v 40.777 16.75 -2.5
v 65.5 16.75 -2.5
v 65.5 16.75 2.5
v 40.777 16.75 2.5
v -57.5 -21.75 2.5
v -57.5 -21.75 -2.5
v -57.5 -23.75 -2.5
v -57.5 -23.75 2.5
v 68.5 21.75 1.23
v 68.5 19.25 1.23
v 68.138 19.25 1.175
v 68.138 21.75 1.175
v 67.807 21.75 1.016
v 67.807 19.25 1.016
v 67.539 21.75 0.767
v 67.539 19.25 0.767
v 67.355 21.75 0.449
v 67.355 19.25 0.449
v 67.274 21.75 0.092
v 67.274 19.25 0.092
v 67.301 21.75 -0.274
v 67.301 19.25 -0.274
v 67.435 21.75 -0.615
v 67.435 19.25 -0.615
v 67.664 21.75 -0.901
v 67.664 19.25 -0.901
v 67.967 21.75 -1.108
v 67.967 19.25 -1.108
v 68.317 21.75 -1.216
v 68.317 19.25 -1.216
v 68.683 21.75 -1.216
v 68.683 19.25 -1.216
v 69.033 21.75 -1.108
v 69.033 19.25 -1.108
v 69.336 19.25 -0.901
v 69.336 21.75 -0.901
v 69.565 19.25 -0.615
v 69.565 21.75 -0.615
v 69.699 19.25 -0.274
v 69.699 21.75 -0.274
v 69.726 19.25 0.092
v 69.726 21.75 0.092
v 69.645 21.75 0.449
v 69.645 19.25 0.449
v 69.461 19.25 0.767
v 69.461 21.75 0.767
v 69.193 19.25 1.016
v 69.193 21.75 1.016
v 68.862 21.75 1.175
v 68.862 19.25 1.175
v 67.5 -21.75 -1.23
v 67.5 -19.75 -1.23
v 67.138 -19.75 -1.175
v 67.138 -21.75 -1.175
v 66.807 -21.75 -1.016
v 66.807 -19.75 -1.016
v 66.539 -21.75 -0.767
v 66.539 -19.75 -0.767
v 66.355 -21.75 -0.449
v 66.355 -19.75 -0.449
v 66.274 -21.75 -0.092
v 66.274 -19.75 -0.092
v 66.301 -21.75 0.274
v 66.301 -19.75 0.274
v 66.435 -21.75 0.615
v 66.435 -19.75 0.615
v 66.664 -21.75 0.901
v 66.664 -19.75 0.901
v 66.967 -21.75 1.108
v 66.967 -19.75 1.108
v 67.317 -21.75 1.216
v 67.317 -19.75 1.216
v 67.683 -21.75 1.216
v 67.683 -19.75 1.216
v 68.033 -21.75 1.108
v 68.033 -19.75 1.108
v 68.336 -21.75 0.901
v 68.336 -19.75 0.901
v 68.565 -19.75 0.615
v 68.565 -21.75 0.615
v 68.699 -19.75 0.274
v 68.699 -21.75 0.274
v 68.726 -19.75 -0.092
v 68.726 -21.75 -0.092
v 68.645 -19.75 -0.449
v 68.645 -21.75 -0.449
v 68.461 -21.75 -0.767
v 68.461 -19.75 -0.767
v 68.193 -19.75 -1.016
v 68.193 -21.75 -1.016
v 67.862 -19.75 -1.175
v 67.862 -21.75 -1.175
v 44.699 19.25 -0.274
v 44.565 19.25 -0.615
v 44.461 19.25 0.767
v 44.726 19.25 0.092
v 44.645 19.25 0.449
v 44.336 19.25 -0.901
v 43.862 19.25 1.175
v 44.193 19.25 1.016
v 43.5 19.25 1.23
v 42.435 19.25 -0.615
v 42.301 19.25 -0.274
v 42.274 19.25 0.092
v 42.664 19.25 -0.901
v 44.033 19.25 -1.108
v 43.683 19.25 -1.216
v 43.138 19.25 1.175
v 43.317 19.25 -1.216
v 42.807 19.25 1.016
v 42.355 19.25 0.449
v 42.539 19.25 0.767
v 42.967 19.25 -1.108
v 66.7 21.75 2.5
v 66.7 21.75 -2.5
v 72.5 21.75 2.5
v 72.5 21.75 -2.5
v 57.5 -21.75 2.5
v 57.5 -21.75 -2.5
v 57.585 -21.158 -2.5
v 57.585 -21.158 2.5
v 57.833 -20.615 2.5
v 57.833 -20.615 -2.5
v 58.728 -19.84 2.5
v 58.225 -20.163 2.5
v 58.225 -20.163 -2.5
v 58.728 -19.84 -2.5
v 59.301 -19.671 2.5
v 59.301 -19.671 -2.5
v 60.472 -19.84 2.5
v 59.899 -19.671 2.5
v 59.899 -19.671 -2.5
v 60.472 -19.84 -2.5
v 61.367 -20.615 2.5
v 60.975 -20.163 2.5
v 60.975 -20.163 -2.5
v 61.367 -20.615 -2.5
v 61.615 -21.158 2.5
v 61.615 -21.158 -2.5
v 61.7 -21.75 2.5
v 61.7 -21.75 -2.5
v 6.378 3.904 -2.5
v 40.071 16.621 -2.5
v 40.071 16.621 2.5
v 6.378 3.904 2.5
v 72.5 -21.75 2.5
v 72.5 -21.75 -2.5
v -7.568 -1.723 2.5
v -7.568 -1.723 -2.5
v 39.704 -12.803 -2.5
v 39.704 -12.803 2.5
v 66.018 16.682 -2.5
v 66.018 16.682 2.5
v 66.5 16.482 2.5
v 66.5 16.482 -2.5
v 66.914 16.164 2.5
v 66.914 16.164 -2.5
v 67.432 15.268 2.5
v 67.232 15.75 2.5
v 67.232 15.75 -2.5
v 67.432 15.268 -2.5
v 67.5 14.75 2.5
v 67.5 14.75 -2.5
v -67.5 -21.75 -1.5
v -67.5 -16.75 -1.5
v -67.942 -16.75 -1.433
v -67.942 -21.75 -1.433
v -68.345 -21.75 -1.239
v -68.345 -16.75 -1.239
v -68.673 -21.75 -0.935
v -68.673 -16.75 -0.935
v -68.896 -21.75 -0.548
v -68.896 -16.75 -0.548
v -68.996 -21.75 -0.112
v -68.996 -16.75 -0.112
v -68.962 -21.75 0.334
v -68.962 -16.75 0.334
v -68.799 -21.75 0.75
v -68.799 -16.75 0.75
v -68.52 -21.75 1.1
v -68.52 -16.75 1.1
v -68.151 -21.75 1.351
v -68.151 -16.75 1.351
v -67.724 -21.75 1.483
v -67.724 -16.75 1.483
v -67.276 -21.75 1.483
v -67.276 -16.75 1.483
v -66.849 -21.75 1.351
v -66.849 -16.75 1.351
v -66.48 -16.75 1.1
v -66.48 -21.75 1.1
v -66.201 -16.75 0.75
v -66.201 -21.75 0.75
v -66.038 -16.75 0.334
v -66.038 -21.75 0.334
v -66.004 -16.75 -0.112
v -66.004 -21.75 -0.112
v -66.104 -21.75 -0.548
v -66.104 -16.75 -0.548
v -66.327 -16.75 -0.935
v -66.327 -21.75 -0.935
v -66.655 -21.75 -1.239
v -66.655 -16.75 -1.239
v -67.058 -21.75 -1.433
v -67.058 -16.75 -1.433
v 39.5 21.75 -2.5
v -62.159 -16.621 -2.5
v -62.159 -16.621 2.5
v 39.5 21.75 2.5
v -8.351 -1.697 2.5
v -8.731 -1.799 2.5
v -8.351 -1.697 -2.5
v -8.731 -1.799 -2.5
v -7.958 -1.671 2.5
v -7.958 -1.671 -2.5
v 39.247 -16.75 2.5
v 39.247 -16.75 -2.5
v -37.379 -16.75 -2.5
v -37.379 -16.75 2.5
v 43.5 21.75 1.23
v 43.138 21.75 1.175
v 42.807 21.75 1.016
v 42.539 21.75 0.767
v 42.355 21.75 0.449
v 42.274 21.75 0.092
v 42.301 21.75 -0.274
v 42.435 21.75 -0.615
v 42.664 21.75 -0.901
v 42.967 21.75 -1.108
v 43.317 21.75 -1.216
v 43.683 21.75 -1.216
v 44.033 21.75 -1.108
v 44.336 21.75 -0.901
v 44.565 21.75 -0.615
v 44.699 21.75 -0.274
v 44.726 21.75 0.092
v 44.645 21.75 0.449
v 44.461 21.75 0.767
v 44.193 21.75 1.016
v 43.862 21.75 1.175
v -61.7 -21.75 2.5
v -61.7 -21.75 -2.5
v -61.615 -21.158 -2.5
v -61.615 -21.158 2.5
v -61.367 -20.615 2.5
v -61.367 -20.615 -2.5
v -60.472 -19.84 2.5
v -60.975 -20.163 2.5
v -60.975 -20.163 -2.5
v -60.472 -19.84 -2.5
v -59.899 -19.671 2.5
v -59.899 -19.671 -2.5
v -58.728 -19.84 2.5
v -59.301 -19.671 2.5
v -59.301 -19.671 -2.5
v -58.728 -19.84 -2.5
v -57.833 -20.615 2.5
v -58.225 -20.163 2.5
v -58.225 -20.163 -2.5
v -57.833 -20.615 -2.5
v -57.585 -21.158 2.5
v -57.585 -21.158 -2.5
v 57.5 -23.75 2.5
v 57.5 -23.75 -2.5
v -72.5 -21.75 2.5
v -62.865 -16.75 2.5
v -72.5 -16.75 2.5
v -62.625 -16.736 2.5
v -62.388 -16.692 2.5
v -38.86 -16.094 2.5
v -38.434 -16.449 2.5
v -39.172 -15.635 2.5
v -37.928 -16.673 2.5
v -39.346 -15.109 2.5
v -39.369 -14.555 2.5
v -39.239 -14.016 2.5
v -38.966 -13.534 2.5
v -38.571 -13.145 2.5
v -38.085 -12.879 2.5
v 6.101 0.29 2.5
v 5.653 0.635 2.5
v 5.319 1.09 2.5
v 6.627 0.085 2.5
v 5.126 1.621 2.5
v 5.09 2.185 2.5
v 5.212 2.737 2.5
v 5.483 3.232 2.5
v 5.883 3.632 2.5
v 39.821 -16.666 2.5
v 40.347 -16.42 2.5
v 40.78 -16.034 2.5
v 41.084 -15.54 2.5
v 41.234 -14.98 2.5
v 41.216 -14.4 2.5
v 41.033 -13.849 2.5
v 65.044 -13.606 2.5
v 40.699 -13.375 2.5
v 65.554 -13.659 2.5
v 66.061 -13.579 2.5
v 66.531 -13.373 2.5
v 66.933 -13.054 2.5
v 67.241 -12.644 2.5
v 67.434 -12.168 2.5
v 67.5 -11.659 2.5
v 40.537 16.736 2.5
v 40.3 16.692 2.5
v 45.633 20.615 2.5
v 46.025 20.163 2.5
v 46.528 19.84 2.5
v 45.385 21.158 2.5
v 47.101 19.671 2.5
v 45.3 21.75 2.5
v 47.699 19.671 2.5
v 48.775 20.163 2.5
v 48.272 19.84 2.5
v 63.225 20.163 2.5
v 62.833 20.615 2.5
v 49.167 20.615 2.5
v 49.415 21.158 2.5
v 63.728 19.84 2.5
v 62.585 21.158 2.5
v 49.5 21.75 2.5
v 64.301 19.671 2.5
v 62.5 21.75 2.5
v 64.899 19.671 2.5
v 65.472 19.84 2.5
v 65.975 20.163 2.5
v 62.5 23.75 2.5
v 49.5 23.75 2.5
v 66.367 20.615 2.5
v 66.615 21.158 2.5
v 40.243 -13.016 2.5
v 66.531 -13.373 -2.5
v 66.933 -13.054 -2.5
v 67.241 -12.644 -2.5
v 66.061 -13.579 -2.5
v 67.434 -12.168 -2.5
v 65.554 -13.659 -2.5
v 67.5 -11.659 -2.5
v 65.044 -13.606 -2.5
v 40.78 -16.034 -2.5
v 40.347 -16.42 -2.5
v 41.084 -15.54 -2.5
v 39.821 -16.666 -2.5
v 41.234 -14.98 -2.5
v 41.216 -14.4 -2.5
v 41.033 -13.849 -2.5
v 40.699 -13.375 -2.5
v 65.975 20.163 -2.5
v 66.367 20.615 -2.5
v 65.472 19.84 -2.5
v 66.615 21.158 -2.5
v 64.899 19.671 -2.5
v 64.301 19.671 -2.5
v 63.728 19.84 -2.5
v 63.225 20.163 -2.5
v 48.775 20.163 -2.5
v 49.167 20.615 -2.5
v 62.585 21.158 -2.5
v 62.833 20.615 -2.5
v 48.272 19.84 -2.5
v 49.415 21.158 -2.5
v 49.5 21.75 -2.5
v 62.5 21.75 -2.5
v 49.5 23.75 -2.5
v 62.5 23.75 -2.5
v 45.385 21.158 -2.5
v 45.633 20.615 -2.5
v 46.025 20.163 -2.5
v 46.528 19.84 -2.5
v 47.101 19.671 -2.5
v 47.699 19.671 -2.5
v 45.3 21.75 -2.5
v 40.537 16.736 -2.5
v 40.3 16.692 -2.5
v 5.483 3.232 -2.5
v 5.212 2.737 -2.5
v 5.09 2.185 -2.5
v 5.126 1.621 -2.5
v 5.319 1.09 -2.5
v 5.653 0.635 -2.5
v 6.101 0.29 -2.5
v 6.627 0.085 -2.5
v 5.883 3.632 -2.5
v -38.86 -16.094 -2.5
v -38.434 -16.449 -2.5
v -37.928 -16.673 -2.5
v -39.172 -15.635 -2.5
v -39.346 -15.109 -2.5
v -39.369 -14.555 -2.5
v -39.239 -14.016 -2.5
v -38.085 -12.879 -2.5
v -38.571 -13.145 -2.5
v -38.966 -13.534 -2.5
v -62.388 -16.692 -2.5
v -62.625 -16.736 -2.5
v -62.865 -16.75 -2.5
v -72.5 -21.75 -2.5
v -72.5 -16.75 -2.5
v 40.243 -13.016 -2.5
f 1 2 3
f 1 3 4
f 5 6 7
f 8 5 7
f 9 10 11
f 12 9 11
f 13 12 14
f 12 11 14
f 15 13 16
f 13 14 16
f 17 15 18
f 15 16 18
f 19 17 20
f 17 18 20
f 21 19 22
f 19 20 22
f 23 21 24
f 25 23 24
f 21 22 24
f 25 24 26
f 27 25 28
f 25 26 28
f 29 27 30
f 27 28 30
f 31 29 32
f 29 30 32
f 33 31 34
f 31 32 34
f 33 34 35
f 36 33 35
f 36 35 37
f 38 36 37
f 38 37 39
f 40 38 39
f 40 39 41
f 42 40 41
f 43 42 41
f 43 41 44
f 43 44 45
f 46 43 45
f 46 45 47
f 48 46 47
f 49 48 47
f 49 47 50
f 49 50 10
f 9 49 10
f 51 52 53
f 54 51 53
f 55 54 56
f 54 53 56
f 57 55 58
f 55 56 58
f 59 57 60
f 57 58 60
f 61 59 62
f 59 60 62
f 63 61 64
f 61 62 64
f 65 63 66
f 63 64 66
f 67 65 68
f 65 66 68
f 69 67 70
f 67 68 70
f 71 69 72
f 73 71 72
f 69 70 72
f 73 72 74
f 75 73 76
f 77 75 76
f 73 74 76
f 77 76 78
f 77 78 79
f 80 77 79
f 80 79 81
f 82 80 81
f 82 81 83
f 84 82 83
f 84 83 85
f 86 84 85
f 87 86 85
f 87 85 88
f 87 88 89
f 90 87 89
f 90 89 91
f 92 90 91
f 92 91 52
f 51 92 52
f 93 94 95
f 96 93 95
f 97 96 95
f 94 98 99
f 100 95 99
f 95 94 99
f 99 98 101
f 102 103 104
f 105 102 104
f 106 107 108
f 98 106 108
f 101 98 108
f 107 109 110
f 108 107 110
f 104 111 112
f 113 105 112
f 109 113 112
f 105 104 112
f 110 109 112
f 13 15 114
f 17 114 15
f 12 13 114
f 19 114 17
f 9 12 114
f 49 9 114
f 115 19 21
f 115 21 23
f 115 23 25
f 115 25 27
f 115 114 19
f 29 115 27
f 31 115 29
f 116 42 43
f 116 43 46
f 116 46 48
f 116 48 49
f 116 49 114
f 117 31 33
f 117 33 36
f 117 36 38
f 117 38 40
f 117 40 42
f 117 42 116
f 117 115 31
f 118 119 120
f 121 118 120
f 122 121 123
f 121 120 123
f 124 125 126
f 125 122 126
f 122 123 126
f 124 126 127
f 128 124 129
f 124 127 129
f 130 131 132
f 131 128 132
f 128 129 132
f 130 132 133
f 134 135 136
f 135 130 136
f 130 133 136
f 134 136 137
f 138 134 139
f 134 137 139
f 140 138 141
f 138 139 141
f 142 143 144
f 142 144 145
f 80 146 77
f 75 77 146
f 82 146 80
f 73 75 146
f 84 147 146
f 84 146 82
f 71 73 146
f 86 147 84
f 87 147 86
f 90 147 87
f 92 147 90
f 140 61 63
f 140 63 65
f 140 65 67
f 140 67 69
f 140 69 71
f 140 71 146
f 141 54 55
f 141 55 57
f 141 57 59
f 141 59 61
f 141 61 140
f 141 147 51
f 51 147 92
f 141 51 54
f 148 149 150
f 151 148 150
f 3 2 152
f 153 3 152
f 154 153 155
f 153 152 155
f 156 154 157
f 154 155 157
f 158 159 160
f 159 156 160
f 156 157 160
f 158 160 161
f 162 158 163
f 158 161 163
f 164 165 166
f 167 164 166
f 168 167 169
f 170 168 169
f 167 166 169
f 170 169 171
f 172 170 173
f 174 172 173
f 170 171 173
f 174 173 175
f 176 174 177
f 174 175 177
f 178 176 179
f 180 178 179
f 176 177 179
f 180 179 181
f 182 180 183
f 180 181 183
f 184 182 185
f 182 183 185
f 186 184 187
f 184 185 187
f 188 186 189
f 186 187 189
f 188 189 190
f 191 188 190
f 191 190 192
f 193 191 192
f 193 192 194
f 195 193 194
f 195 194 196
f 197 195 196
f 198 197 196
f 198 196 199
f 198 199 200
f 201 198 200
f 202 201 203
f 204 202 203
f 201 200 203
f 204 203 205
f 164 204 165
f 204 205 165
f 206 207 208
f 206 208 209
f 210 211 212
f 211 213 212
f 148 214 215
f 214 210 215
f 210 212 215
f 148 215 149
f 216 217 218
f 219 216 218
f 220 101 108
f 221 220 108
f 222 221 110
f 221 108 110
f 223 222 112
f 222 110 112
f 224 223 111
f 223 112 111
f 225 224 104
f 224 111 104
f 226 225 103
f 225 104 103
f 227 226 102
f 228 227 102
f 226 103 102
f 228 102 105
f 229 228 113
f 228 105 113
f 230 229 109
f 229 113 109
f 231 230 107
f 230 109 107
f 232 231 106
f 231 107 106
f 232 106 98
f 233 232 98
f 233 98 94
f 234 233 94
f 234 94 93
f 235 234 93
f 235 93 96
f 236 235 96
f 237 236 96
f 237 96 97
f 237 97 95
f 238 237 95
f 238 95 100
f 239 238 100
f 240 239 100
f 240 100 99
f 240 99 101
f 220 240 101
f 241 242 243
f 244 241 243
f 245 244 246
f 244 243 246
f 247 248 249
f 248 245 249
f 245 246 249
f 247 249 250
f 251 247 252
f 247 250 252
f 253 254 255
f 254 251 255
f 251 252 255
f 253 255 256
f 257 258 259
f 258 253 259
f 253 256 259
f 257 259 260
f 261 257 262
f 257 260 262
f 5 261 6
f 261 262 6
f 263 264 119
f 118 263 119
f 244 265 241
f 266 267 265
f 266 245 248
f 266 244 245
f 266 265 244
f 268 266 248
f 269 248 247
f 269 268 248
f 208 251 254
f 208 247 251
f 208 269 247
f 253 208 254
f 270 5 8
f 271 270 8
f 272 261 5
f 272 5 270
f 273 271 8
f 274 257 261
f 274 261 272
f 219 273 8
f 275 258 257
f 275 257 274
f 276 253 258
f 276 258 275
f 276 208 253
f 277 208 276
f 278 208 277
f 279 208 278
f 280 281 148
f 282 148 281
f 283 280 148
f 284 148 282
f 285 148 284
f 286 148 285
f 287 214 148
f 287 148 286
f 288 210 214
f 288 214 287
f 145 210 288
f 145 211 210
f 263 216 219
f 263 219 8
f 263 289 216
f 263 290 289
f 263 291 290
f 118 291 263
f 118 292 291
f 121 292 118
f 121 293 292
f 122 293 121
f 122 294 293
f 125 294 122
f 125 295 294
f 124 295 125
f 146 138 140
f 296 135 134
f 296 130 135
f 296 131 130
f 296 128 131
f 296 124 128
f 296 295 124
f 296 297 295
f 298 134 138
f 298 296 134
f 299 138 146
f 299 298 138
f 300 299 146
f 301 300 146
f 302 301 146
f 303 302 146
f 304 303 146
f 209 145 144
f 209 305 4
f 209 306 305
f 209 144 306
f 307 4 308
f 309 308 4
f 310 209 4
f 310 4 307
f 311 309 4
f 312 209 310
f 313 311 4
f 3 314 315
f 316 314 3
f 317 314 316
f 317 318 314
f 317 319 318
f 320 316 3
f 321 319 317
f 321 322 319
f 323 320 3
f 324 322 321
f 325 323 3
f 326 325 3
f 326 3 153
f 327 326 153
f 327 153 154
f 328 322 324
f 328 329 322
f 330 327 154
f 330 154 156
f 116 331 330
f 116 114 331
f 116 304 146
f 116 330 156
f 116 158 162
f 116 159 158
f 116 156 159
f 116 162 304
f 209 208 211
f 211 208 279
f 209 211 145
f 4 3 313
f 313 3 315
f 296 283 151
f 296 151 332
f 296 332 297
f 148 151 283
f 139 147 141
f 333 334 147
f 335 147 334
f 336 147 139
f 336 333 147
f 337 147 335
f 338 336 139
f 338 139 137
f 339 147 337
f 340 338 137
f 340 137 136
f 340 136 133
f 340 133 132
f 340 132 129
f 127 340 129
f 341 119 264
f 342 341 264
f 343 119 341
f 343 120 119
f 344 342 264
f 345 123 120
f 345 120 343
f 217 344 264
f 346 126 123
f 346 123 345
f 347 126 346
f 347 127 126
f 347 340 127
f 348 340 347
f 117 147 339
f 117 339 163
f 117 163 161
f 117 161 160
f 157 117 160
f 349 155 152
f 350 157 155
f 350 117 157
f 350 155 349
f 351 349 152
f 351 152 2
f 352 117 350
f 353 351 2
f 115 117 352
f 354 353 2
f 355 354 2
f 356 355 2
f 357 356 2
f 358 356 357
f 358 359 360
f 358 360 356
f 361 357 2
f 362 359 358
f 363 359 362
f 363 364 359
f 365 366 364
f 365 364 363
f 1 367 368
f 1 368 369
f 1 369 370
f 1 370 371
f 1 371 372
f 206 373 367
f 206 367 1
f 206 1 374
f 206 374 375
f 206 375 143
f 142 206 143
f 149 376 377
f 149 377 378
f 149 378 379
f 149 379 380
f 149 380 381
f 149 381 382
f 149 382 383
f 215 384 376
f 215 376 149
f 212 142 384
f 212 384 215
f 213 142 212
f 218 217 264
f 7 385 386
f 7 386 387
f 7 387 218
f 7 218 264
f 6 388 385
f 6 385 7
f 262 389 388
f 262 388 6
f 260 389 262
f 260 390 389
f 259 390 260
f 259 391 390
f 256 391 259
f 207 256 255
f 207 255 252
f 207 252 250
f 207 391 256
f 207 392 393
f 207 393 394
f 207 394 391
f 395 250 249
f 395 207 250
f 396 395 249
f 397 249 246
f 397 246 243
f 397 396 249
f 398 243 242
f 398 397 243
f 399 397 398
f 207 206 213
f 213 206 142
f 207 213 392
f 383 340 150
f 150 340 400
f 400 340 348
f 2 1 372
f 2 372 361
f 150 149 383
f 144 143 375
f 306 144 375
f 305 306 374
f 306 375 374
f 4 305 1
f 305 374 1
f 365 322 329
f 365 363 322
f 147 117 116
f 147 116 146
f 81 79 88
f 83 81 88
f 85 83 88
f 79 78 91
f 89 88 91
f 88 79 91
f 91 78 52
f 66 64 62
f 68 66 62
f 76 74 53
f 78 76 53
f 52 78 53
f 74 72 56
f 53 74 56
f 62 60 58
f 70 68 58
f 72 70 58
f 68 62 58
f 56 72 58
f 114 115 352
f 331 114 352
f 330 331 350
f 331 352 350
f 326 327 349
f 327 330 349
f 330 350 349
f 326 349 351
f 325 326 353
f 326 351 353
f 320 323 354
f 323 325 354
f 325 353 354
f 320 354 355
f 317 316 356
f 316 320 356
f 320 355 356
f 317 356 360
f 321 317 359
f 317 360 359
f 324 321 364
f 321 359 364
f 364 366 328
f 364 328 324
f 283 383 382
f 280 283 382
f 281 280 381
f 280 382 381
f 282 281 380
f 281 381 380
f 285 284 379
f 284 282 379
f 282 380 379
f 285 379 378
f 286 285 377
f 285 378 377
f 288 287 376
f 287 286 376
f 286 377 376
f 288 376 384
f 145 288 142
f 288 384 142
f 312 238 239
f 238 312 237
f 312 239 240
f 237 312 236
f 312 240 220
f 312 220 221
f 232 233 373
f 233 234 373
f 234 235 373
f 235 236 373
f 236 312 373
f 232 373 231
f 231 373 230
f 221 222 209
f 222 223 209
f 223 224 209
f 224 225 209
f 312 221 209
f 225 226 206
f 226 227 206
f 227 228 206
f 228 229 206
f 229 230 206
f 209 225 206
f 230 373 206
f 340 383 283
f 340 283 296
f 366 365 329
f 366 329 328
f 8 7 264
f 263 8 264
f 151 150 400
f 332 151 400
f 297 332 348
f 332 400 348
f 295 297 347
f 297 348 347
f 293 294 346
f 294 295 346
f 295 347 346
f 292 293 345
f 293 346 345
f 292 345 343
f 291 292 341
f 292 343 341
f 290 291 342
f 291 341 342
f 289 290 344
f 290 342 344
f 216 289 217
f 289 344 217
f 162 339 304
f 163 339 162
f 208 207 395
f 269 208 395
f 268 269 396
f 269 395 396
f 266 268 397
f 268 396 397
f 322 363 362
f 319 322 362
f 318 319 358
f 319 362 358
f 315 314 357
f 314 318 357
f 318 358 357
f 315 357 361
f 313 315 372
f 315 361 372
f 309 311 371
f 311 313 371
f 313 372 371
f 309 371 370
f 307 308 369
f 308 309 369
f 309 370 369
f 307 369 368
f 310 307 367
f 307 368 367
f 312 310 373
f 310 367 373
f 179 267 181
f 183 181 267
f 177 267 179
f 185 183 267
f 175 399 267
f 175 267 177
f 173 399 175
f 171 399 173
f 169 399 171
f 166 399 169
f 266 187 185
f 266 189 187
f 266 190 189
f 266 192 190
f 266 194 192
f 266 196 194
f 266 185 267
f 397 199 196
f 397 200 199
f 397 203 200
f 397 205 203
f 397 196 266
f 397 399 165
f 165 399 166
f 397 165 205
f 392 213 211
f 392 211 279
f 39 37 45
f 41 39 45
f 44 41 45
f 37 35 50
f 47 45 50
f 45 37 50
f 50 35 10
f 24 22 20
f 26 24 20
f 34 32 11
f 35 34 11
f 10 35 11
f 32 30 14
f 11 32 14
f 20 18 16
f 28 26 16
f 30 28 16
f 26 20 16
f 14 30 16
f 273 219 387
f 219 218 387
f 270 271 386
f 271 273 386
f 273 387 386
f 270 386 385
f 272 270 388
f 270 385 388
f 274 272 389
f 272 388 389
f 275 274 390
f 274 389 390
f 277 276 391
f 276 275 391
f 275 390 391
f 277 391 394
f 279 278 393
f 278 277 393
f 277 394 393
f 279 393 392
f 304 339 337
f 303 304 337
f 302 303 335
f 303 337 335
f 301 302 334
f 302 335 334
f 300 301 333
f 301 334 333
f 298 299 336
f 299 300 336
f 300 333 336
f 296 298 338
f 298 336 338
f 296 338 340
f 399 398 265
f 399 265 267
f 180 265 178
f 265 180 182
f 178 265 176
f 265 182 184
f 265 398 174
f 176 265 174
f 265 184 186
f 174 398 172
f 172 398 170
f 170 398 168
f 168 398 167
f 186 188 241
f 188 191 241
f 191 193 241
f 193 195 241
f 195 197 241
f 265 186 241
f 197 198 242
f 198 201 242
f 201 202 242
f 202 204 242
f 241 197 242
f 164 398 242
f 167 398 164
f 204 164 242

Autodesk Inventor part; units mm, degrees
ref_plane "YZ Plane" through (0, 0, 0) normal (1, 0, 0) x (0, 1, 0)
ref_plane "XZ Plane" through (0, 0, 0) normal (0, 1, 0) x (-1, 0, 0)
ref_plane "XY Plane" through (0, 0, 0) normal (0, 0, 1) x (1, 0, 0)
sketch "スケッチ1" plane through (0, 0, 0) normal (0, 0, 1) x (1, 0, 0)
  line L0 (-72.5, -21.75) -> (72.5, -21.75) construction
  line L1 (72.5, -21.75) -> (72.5, 21.75) construction
  line L2 (72.5, 21.75) -> (-72.5, 21.75) construction
  line L3 (-72.5, 21.75) -> (-72.5, -21.75) construction
  line L4 (-72.5, -21.75) -> (72.5, 21.75) construction
  line L5 (72.5, -21.75) -> (-72.5, 21.75) construction
  line L6 (-67.5, 21.75) -> (-67.5, -21.75) construction
  line L7 (0, 0) -> (0, 21.75) construction
  line L8 (0, 0) -> (-72.5, 0) construction
  line L9 (67.5, 21.75) -> (67.5, -11.6593) construction
  line L10 (-72.5, -21.75) -> (-61.7, -21.75)
  line L11 (49.5, 21.75) -> (49.5, 23.75)
  line L12 (49.5, 23.75) -> (62.5, 23.75)
  line L13 (62.5, 23.75) -> (62.5, 21.75)
  line L14 (66.7, 21.75) -> (72.5, 21.75)
  line L15 (72.5, 21.75) -> (72.5, -21.75)
  line L16 (72.5, -21.75) -> (61.7, -21.75)
  line L17 (-57.5, -21.75) -> (-57.5, -23.75)
  line L18 (-57.5, -23.75) -> (57.5, -23.75)
  line L19 (57.5, -23.75) -> (57.5, -21.75)
  arc A0 (45.3, 21.75) -> (49.5, 21.75) centre (47.4, 21.75) ccw
  arc A1 (62.5, 21.75) -> (66.7, 21.75) centre (64.6, 21.75) ccw
  arc A2 (-57.5, -21.75) -> (-61.7, -21.75) centre (-59.6, -21.75) ccw
  arc A3 (61.7, -21.75) -> (57.5, -21.75) centre (59.6, -21.75) ccw
  line L20 (-72.5, -21.75) -> (-72.5, -16.75)
  line L21 (45.3, 21.75) -> (39.5, 21.75)
  line L22 (66.95, 24.476) -> (70.05, 24.476) construction
  line L23 (70.05, 24.476) -> (70.05, 13.3235) construction
  line L24 (70.05, 13.3235) -> (66.95, 13.3235) construction
  line L25 (66.95, 13.3235) -> (66.95, 24.476) construction
  line L26 (68.5, 24.476) -> (68.5, 13.3235) construction
  line L27 (41.95, 24.476) -> (45.05, 24.476) construction
  line L28 (45.05, 24.476) -> (45.05, 13.9945) construction
  line L29 (45.05, 13.9945) -> (41.95, 13.9945) construction
  line L30 (41.95, 13.9945) -> (41.95, 24.476) construction
  line L31 (43.5, 24.476) -> (43.5, 13.9945) construction
  line L32 (-72.5, -16.75) -> (-62.8649, -16.75)
  line L33 (-62.1586, -16.6211) -> (39.5, 21.75)
  line L34 (40.0708, 16.6211) -> (6.3776, 3.9036) construction
  line L35 (-48.341, -16.75) -> (67.5, -16.75) construction
  line L36 (67.5, -16.75) -> (67.5, 14.75) construction
  line L37 (65.5, 16.75) -> (40.7771, 16.75)
  line L38 (67.5, -16.75) -> (-3.9644, 0) construction
  line L39 (-8.731, -1.7991) -> (-38.085, -12.8789)
  line L40 (-7.5683, -1.7231) -> (39.7036, -12.8028)
  line L41 (39.2472, -16.75) -> (-37.3787, -16.75)
  line L42 (6.6274, 0.0852) -> (65.0436, -13.6065)
  line L43 (67.5, -14.1822) -> (67.5, 16.75)
  arc A4 (65.0436, -13.6065) -> (67.5, -11.6593) centre (65.5, -11.6593) ccw
  arc A5 (6.3776, 3.9036) -> (6.6274, 0.0852) centre (7.0838, 2.0324) ccw
  line L44 (40.0708, 16.6211) -> (6.3776, 3.9036)
  arc A6 (40.7771, 16.75) -> (40.0708, 16.6211) centre (40.7771, 14.75) ccw
  arc A7 (67.5, 14.75) -> (65.5, 16.75) centre (65.5, 14.75) ccw
  arc A8 (-38.085, -12.8789) -> (-37.3787, -16.75) centre (-37.3787, -14.75) ccw
  arc A9 (-7.5683, -1.7231) -> (-8.731, -1.7991) centre (-8.0247, -3.6703) ccw
  arc A10 (39.2472, -16.75) -> (39.7036, -12.8028) centre (39.2472, -14.75) ccw
  arc A11 (-62.8649, -16.75) -> (-62.1586, -16.6211) centre (-62.8649, -14.75) ccw
  point P0 (67.5, -21.75)
  point P1 (-62.5, -16.75)
  point P2 (40.4122, 16.75)
  point P3 (-8.1612, -1.5841)
  point P4 (56.5446, -16.75)
  point P5 (67.5, -11.6593)
  dimension "d16" = 5
  dimension "d20" = 43.5
  dimension "d40" = 135
  dimension "d41" = 10
  dimension "d42" = 2.1
  dimension "d43" = 2
  dimension "d44" = 5
  dimension "d45" = 10
  dimension "d46" = 10
  dimension "d48" = 3.1
  dimension "d50" = 4
  dimension "d51" = 25
  dimension "d52" = 3.1
  dimension "d62" = 6
  dimension "d63" = 6
  dimension "d88" = 10
  dimension "d90" = 5
  dimension "d91" = 5
  dimension "d93" = 5
  dimension "d94" = 94.8651
  dimension "d96" = 47.4325
  dimension "d97" = 2.5
  dimension "d98" = 5
  dimension "d99" = 2
  dimension "d100" = 2
  dimension "d101" = 5
  dimension "d102" = 2
  dimension "d103" = 2
  dimension "d104" = 2
  dimension "d105" = 2
extrude "押し出し1" add sketch "スケッチ1" along normal blind 2.5
mirror "ミラー1" about plane through (0, 0, 0) normal (0, 0, -1) of "押し出し1"
sketch "スケッチ2" plane through (-72.5, -21.75, 2.5) normal (0, -1, 0) x (1, 0, 0)
  line L0 (0, -5) -> (0, 0)
  line L1 (15, -5) -> (130, -5) construction
  line L2 (72.5, -5) -> (72.5, 0) construction
  line L3 (15, 0) -> (130, 0) construction
  point P0 (72.5, -2.5)
  point P1 (140, -2.5)
  point P2 (0, -2.5)
hole "穴1" at (67.5, -21.75, 0) direction (0, 1, 0) diameter 2.459 depth 2 thread size "M3x0.5" class "6H" standard "ISO Metric profile"
sketch "スケッチ4" plane through (66.7, 21.75, 2.5) normal (0, 1, 0) x (1, 0, 0)
  line L0 (5.8, 5) -> (5.8, 0) projected
  point P0 (-66.7, 2.5)
  point P1 (1.8, 2.5)
  point P2 (-23.2, 2.5)
  point P3 (5.8, 2.5)
  dimension "d53" = 4
  dimension "d54" = 25
hole "穴2" at (68.5, 21.75, 0) at (43.5, 21.75, 0) direction (0, -1, 0) diameter 2.459 depth 2.5 thread size "M3x0.5" class "6H" standard "ISO Metric profile"
sketch "スケッチ7" plane through (-72.5, -21.75, 2.5) normal (0, -1, 0) x (1, 0, 0)
  line L0 (0, -5) -> (0, 0) projected
  line L1 (15, 0) -> (130, 0) projected
  line L2 (15, -5) -> (130, -5) projected
  line L3 (0, -2.5) -> (5, -2.5)
  point P0 (72.5, -2.5)
  dimension "d80" = 5
hole "穴3" at (-67.5, -21.75, 0) direction (0, 1, 0) diameter 3 end through all
equation "\"d16\" = d4"
equation "\"d40\" = d6"
equation "\"d41\" = d3"
equation "\"d46\" = d45"
equation "\"d63\" = d62"
equation "\"d53\" = d50"
equation "\"d54\" = d51"
equation "\"d4\" = 5"
equation "\"d6\" = 135"
equation "\"d3\" = 10"
properties part number "ForeArm_diagonal" material "アセタール樹脂、黒"
